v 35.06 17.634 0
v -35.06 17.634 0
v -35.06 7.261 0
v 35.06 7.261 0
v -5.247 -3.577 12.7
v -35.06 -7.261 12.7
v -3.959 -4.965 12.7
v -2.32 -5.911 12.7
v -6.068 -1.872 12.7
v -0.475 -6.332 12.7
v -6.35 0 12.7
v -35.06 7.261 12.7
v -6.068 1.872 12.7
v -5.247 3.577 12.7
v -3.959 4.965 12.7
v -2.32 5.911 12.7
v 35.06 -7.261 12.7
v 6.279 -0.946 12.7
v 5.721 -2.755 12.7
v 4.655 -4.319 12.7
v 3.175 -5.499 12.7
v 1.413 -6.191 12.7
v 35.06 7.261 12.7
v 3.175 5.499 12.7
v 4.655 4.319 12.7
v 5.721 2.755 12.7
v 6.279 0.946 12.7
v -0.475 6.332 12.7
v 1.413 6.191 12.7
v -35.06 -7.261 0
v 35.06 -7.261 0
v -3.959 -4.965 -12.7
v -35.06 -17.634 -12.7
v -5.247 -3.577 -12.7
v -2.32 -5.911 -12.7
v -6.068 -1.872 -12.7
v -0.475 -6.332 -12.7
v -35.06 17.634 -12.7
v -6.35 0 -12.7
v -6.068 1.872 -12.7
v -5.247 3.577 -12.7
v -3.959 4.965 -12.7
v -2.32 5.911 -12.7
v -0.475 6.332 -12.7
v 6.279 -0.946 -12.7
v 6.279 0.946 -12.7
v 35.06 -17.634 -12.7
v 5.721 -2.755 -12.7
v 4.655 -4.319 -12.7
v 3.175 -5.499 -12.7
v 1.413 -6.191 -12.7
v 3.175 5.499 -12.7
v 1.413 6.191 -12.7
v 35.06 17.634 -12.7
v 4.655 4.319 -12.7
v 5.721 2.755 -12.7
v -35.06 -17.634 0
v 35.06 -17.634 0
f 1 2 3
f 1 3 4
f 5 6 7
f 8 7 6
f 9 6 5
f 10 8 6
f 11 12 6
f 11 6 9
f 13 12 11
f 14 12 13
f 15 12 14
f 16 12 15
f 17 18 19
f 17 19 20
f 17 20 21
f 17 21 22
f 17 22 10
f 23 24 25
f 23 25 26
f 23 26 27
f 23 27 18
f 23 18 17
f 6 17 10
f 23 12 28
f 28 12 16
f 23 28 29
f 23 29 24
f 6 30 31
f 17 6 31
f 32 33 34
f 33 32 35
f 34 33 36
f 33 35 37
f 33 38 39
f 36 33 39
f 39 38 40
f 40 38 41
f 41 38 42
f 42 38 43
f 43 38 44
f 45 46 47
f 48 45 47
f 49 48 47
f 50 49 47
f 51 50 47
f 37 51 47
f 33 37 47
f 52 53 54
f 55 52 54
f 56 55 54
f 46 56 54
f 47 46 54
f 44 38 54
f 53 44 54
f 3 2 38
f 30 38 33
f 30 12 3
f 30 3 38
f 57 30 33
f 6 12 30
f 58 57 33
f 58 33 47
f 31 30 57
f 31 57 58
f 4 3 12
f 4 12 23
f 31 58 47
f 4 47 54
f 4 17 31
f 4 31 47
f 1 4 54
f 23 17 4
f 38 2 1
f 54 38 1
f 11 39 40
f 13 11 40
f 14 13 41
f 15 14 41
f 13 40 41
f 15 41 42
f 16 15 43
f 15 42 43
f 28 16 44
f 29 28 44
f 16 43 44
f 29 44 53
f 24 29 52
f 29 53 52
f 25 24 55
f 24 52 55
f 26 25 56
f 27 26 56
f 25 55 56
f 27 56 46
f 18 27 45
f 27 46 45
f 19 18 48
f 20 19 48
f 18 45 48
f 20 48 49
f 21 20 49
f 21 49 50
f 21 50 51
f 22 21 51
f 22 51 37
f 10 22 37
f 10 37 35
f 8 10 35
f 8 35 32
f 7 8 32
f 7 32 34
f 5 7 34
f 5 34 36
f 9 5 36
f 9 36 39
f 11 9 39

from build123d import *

# Parameters (mm, degrees)
F0_W     = 70.120454
F0_H     = 10.372847
F0_H_2   = 14.521986
F1_DEPTH = 12.7
F2_DEPTH = 12.7
F4_D     = 12.7


with BuildPart() as f1:
    # F0 (on Top) → F1 (new body)
    with BuildSketch(Plane.XY):
        with Locations((0, -12.447416)):
            Rectangle(F0_W, F0_H)
        Rectangle(F0_W, F0_H_2)
        with Locations((0, 12.447416)):
            Rectangle(F0_W, F0_H)
    extrude(amount=-F1_DEPTH)

    # F0 (on Top) → F2 (join)
    with BuildSketch(Plane.XY):
        Rectangle(F0_W, F0_H_2)
    extrude(amount=F2_DEPTH)

    # F4 (through all)
    with Locations(Plane.XY.offset(12.7)):
        with Locations((0, 0)):
            Hole(F4_D / 2)


solid = f1.part
